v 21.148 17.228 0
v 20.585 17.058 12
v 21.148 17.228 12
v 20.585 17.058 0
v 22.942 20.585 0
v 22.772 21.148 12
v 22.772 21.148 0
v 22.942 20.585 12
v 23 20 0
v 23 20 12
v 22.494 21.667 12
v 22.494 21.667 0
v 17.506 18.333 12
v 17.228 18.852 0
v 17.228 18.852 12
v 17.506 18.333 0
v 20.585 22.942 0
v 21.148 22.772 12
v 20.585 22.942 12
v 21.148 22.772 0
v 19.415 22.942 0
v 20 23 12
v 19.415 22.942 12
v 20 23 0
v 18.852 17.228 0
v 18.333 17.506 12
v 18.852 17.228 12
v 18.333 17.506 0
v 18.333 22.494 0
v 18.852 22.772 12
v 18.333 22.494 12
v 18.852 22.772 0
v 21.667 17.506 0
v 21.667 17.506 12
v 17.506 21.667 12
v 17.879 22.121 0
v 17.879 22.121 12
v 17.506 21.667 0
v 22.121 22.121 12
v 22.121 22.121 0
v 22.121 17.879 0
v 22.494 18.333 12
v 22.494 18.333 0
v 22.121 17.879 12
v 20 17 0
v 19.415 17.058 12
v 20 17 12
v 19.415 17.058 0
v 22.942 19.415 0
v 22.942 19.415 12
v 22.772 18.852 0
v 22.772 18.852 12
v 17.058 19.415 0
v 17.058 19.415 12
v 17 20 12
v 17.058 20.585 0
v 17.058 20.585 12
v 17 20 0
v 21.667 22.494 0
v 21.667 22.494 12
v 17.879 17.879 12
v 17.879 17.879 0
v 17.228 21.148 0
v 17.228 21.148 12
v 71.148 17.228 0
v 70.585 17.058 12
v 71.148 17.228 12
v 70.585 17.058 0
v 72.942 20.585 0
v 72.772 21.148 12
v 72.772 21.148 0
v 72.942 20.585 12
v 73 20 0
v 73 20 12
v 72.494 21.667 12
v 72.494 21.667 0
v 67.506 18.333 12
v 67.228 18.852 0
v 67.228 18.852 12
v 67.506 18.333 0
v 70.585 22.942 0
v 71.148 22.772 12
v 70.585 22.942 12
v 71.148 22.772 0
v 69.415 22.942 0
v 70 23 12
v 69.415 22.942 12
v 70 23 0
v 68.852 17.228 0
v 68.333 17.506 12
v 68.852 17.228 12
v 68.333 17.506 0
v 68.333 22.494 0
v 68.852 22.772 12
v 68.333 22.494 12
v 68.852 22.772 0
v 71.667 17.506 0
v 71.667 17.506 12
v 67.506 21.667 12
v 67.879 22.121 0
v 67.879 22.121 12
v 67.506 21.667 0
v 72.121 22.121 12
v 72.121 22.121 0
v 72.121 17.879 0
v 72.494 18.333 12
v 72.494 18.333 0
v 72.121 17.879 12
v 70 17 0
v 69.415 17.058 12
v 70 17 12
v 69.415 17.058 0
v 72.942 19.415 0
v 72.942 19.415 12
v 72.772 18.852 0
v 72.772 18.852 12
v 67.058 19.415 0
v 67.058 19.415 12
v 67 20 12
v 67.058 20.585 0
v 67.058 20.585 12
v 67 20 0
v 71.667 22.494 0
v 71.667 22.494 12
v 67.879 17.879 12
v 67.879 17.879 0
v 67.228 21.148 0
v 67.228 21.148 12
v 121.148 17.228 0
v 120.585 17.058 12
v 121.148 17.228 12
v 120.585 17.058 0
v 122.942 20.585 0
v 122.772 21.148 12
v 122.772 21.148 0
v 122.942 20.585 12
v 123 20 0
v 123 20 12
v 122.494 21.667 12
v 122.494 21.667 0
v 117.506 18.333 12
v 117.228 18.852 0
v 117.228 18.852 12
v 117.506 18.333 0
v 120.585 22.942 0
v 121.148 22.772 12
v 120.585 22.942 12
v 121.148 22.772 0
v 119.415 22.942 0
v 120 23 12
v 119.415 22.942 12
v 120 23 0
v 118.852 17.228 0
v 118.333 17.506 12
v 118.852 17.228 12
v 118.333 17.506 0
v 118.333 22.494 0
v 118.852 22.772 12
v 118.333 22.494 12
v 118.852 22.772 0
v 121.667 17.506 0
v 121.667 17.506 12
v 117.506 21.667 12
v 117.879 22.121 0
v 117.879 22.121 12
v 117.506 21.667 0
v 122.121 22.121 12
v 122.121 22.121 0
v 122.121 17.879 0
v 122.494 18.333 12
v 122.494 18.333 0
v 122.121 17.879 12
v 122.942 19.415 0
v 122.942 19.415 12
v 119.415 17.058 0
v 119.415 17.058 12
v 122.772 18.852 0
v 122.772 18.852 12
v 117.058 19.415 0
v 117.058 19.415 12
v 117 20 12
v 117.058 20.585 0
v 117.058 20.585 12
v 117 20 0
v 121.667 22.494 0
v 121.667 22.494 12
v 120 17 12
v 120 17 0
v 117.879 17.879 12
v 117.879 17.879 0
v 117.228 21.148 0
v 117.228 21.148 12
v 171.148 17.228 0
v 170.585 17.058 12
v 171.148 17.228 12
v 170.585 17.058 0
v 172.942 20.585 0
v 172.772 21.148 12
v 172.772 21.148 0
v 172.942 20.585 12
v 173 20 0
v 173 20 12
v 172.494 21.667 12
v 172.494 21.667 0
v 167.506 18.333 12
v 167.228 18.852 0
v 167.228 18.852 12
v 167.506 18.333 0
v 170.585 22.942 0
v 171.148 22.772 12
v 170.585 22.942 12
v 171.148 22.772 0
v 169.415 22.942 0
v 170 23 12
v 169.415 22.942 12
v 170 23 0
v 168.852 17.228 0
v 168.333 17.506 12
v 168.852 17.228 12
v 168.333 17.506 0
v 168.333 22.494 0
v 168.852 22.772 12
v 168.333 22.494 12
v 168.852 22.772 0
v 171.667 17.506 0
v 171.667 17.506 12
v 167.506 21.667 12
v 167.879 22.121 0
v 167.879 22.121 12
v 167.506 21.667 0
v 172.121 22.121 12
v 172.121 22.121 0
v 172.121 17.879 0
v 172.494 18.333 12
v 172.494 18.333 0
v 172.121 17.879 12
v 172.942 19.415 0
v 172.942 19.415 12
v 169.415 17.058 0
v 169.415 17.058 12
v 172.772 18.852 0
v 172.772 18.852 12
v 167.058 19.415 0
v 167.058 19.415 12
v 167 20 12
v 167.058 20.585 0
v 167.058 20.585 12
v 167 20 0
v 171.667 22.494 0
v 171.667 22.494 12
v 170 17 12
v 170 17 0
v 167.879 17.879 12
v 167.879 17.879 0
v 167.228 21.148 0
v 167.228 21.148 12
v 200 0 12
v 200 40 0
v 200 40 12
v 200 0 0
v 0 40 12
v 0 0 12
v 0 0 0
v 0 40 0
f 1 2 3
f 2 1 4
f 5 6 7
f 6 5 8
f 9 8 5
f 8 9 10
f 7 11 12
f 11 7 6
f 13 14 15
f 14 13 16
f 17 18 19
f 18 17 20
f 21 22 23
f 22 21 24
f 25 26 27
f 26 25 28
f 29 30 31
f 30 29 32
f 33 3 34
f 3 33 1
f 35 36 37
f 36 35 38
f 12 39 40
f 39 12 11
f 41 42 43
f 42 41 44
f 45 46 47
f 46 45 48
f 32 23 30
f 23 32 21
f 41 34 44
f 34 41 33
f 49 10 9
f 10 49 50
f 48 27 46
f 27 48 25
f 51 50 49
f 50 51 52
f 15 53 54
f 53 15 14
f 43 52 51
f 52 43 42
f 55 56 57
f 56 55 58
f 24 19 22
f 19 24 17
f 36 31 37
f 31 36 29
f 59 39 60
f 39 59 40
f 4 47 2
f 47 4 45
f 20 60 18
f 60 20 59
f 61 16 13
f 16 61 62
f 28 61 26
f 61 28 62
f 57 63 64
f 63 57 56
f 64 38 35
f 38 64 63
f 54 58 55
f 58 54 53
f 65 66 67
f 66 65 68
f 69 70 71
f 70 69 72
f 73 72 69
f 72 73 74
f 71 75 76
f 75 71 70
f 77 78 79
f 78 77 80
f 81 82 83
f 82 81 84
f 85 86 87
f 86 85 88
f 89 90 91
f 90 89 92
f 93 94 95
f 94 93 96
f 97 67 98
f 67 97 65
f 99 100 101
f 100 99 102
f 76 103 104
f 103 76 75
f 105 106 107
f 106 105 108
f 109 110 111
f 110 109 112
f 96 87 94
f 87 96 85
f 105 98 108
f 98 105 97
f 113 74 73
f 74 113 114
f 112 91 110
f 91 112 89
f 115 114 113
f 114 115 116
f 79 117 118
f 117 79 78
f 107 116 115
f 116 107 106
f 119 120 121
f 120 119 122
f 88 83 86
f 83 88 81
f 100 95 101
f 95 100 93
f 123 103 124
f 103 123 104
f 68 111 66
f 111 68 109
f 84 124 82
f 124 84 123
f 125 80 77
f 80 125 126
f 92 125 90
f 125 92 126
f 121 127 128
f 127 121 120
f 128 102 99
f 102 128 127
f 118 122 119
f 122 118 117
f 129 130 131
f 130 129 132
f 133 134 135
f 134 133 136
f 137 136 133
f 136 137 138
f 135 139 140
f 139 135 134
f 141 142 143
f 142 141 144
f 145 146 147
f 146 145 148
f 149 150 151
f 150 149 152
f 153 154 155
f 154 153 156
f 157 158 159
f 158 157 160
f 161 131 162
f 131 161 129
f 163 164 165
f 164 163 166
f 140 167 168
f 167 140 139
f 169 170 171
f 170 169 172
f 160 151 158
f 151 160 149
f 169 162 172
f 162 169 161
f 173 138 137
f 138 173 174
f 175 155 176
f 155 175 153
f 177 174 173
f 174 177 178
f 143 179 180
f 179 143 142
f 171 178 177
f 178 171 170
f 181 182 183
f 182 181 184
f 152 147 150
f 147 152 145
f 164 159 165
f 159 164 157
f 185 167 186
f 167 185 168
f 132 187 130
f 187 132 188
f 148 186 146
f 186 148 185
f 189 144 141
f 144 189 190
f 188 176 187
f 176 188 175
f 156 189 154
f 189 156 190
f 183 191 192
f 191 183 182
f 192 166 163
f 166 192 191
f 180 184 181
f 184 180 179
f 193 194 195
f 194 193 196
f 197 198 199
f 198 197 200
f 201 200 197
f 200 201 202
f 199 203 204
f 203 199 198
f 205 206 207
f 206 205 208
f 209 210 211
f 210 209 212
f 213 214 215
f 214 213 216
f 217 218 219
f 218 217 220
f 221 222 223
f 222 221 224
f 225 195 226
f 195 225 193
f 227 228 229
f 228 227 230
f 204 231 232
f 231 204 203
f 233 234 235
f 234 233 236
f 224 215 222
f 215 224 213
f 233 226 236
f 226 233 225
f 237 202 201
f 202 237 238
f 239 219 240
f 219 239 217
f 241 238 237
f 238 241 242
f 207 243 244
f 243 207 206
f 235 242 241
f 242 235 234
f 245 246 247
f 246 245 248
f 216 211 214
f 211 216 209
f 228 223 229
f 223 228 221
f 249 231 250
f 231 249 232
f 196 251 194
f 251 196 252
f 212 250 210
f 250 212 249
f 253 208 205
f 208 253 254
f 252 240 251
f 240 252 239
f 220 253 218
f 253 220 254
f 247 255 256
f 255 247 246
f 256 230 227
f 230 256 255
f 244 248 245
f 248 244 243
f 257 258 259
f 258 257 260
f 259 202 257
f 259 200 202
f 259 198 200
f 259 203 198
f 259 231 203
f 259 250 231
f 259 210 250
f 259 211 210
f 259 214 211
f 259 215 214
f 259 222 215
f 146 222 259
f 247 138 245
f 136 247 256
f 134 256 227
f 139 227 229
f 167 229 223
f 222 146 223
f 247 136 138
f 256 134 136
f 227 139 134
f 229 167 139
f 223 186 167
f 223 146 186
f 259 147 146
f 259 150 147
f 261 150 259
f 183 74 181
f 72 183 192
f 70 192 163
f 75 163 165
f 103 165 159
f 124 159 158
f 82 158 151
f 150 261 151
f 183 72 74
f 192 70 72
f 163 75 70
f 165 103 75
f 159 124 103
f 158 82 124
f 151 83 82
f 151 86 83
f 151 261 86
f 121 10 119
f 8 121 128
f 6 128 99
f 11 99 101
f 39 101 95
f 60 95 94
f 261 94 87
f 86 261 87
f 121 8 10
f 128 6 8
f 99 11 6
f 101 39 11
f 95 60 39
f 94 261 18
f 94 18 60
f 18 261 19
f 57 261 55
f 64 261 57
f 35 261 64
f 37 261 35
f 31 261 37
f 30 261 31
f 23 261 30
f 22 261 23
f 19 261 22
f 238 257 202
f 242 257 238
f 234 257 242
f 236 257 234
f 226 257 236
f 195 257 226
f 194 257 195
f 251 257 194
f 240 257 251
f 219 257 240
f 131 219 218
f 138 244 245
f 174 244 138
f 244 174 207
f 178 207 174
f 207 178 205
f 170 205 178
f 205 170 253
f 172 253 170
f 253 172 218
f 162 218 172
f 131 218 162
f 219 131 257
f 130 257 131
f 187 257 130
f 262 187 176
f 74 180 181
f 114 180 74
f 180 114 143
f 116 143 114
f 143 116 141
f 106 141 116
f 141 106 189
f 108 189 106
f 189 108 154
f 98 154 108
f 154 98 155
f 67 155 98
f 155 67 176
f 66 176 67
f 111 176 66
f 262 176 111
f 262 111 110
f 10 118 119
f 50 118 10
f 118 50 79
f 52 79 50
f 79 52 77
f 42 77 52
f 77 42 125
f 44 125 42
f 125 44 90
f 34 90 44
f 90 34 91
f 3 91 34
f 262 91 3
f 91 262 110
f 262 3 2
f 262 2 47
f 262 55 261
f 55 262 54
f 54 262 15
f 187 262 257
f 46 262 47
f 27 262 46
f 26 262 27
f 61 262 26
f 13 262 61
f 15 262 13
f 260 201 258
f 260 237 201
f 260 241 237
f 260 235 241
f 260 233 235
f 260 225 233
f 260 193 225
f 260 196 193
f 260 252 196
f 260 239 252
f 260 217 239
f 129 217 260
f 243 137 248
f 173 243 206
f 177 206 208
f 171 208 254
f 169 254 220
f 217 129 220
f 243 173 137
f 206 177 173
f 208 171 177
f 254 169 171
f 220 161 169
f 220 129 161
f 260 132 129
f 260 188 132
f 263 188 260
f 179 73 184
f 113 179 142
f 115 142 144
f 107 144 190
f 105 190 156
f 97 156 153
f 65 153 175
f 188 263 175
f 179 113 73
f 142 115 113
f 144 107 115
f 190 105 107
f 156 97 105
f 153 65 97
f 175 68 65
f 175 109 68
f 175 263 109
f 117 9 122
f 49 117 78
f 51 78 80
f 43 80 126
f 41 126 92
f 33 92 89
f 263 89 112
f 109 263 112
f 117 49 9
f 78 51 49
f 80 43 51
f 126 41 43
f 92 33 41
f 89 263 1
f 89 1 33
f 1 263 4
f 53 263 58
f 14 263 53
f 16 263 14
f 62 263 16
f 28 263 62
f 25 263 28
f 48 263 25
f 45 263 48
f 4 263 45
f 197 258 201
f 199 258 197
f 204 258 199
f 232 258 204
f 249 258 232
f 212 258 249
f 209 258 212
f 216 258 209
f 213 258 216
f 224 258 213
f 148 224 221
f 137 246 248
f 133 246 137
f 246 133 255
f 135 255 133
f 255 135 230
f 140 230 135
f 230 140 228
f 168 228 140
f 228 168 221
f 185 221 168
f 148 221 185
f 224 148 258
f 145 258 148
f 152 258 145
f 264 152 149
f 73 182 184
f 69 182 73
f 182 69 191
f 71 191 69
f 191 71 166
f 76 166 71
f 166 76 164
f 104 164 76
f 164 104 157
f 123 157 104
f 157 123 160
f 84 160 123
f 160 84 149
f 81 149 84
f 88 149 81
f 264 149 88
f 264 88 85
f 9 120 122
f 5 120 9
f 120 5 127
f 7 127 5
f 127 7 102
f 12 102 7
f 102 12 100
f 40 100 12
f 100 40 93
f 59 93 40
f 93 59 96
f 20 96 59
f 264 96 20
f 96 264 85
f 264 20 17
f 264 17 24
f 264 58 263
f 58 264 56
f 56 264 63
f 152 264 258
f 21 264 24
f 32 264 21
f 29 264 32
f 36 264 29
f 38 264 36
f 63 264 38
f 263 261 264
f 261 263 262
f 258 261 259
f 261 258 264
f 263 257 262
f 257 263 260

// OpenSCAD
$fn = 32;

// ----------------------------------------------------------------------
// Long rail: 200-250 mm mounting rail
// ----------------------------------------------------------------------

// --- parameters (mm) ---
rail_l = 200;             // rail length, X
rail_w = 40;              // rail width, Y
rail_t = 12;              // rail thickness, Z
hole_d = 6;               // mounting hole diameter
hole_start = 20;          // first hole offset from the end
hole_pitch = 50;          // hole pitch
holes = 4;                // number of holes

difference() {
  cube([rail_l, rail_w, rail_t]);
  for (i = [0 : holes - 1])
    translate([hole_start + i * hole_pitch, rail_w / 2, -1])
      cylinder(h = rail_t + 2, d = hole_d);
}
